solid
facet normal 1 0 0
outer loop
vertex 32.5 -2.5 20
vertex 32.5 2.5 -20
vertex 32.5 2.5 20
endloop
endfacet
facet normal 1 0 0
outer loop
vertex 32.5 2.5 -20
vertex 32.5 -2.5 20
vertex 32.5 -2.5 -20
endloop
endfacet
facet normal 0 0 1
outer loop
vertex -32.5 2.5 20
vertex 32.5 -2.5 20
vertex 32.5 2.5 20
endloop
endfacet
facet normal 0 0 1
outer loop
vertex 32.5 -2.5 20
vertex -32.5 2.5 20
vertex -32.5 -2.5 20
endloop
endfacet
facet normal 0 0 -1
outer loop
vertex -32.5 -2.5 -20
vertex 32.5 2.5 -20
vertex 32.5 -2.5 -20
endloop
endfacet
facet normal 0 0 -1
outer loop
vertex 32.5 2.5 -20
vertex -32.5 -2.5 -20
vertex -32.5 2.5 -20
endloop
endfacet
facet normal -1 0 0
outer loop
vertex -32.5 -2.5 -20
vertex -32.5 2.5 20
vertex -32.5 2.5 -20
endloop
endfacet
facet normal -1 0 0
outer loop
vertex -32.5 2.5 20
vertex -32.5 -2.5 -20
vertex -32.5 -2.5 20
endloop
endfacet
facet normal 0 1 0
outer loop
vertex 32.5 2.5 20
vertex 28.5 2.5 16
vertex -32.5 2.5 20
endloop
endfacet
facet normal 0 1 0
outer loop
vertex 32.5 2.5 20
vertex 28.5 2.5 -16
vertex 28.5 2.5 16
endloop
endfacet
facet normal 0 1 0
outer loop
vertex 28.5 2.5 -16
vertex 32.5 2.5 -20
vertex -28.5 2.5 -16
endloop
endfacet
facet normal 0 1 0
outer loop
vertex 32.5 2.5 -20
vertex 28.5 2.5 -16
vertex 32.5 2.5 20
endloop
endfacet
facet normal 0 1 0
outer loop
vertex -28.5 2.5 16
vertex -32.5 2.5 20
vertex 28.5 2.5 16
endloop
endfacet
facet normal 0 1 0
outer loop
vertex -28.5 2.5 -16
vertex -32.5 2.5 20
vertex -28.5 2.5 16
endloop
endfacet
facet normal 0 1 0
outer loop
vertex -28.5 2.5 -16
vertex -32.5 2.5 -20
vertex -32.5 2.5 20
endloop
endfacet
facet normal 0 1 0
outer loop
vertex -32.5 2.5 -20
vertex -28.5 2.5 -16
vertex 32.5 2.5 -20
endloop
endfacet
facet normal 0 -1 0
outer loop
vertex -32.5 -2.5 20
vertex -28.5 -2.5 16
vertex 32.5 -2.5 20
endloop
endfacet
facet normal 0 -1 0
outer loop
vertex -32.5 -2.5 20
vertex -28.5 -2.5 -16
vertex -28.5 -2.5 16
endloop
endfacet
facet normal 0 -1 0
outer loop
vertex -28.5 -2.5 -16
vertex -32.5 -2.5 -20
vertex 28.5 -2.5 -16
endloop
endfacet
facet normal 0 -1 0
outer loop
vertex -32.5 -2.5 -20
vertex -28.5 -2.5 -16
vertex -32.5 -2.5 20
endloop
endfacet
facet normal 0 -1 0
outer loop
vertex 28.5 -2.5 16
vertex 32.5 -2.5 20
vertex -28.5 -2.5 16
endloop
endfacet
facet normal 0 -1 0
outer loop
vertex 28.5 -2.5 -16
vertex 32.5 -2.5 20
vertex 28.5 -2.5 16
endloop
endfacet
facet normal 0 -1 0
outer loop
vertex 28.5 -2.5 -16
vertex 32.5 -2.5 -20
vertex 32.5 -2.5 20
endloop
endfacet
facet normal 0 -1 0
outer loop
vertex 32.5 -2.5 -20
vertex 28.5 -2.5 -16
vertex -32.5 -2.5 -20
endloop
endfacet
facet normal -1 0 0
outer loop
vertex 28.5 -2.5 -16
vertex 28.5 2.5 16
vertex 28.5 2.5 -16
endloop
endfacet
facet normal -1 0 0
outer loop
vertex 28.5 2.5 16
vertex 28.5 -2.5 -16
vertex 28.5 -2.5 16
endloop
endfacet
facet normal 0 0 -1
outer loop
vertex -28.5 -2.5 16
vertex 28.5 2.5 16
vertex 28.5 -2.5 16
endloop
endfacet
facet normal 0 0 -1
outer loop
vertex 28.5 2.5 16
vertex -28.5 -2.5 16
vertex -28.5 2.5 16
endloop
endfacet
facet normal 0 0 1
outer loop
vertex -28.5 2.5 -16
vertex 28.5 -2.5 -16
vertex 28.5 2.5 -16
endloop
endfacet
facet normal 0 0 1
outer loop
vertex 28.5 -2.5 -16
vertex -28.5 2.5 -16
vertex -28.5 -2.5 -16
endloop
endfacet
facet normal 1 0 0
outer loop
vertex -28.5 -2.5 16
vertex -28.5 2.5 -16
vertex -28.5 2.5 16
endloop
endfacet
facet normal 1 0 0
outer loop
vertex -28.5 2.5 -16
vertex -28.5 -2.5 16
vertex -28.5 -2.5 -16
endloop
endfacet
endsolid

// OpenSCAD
echo("Работа Газмагомадова Исмаила");
w_Frame = 65;
d_Frame = 5;
h_Frame = 40;
fitnes_Frame = 4;

difference() {
    cube([w_Frame, d_Frame, h_Frame], center = true);
    color("red") 
    cube([w_Frame - 2 * fitnes_Frame, d_Frame + 2, h_Frame - 2 * fitnes_Frame], center = true);
}
